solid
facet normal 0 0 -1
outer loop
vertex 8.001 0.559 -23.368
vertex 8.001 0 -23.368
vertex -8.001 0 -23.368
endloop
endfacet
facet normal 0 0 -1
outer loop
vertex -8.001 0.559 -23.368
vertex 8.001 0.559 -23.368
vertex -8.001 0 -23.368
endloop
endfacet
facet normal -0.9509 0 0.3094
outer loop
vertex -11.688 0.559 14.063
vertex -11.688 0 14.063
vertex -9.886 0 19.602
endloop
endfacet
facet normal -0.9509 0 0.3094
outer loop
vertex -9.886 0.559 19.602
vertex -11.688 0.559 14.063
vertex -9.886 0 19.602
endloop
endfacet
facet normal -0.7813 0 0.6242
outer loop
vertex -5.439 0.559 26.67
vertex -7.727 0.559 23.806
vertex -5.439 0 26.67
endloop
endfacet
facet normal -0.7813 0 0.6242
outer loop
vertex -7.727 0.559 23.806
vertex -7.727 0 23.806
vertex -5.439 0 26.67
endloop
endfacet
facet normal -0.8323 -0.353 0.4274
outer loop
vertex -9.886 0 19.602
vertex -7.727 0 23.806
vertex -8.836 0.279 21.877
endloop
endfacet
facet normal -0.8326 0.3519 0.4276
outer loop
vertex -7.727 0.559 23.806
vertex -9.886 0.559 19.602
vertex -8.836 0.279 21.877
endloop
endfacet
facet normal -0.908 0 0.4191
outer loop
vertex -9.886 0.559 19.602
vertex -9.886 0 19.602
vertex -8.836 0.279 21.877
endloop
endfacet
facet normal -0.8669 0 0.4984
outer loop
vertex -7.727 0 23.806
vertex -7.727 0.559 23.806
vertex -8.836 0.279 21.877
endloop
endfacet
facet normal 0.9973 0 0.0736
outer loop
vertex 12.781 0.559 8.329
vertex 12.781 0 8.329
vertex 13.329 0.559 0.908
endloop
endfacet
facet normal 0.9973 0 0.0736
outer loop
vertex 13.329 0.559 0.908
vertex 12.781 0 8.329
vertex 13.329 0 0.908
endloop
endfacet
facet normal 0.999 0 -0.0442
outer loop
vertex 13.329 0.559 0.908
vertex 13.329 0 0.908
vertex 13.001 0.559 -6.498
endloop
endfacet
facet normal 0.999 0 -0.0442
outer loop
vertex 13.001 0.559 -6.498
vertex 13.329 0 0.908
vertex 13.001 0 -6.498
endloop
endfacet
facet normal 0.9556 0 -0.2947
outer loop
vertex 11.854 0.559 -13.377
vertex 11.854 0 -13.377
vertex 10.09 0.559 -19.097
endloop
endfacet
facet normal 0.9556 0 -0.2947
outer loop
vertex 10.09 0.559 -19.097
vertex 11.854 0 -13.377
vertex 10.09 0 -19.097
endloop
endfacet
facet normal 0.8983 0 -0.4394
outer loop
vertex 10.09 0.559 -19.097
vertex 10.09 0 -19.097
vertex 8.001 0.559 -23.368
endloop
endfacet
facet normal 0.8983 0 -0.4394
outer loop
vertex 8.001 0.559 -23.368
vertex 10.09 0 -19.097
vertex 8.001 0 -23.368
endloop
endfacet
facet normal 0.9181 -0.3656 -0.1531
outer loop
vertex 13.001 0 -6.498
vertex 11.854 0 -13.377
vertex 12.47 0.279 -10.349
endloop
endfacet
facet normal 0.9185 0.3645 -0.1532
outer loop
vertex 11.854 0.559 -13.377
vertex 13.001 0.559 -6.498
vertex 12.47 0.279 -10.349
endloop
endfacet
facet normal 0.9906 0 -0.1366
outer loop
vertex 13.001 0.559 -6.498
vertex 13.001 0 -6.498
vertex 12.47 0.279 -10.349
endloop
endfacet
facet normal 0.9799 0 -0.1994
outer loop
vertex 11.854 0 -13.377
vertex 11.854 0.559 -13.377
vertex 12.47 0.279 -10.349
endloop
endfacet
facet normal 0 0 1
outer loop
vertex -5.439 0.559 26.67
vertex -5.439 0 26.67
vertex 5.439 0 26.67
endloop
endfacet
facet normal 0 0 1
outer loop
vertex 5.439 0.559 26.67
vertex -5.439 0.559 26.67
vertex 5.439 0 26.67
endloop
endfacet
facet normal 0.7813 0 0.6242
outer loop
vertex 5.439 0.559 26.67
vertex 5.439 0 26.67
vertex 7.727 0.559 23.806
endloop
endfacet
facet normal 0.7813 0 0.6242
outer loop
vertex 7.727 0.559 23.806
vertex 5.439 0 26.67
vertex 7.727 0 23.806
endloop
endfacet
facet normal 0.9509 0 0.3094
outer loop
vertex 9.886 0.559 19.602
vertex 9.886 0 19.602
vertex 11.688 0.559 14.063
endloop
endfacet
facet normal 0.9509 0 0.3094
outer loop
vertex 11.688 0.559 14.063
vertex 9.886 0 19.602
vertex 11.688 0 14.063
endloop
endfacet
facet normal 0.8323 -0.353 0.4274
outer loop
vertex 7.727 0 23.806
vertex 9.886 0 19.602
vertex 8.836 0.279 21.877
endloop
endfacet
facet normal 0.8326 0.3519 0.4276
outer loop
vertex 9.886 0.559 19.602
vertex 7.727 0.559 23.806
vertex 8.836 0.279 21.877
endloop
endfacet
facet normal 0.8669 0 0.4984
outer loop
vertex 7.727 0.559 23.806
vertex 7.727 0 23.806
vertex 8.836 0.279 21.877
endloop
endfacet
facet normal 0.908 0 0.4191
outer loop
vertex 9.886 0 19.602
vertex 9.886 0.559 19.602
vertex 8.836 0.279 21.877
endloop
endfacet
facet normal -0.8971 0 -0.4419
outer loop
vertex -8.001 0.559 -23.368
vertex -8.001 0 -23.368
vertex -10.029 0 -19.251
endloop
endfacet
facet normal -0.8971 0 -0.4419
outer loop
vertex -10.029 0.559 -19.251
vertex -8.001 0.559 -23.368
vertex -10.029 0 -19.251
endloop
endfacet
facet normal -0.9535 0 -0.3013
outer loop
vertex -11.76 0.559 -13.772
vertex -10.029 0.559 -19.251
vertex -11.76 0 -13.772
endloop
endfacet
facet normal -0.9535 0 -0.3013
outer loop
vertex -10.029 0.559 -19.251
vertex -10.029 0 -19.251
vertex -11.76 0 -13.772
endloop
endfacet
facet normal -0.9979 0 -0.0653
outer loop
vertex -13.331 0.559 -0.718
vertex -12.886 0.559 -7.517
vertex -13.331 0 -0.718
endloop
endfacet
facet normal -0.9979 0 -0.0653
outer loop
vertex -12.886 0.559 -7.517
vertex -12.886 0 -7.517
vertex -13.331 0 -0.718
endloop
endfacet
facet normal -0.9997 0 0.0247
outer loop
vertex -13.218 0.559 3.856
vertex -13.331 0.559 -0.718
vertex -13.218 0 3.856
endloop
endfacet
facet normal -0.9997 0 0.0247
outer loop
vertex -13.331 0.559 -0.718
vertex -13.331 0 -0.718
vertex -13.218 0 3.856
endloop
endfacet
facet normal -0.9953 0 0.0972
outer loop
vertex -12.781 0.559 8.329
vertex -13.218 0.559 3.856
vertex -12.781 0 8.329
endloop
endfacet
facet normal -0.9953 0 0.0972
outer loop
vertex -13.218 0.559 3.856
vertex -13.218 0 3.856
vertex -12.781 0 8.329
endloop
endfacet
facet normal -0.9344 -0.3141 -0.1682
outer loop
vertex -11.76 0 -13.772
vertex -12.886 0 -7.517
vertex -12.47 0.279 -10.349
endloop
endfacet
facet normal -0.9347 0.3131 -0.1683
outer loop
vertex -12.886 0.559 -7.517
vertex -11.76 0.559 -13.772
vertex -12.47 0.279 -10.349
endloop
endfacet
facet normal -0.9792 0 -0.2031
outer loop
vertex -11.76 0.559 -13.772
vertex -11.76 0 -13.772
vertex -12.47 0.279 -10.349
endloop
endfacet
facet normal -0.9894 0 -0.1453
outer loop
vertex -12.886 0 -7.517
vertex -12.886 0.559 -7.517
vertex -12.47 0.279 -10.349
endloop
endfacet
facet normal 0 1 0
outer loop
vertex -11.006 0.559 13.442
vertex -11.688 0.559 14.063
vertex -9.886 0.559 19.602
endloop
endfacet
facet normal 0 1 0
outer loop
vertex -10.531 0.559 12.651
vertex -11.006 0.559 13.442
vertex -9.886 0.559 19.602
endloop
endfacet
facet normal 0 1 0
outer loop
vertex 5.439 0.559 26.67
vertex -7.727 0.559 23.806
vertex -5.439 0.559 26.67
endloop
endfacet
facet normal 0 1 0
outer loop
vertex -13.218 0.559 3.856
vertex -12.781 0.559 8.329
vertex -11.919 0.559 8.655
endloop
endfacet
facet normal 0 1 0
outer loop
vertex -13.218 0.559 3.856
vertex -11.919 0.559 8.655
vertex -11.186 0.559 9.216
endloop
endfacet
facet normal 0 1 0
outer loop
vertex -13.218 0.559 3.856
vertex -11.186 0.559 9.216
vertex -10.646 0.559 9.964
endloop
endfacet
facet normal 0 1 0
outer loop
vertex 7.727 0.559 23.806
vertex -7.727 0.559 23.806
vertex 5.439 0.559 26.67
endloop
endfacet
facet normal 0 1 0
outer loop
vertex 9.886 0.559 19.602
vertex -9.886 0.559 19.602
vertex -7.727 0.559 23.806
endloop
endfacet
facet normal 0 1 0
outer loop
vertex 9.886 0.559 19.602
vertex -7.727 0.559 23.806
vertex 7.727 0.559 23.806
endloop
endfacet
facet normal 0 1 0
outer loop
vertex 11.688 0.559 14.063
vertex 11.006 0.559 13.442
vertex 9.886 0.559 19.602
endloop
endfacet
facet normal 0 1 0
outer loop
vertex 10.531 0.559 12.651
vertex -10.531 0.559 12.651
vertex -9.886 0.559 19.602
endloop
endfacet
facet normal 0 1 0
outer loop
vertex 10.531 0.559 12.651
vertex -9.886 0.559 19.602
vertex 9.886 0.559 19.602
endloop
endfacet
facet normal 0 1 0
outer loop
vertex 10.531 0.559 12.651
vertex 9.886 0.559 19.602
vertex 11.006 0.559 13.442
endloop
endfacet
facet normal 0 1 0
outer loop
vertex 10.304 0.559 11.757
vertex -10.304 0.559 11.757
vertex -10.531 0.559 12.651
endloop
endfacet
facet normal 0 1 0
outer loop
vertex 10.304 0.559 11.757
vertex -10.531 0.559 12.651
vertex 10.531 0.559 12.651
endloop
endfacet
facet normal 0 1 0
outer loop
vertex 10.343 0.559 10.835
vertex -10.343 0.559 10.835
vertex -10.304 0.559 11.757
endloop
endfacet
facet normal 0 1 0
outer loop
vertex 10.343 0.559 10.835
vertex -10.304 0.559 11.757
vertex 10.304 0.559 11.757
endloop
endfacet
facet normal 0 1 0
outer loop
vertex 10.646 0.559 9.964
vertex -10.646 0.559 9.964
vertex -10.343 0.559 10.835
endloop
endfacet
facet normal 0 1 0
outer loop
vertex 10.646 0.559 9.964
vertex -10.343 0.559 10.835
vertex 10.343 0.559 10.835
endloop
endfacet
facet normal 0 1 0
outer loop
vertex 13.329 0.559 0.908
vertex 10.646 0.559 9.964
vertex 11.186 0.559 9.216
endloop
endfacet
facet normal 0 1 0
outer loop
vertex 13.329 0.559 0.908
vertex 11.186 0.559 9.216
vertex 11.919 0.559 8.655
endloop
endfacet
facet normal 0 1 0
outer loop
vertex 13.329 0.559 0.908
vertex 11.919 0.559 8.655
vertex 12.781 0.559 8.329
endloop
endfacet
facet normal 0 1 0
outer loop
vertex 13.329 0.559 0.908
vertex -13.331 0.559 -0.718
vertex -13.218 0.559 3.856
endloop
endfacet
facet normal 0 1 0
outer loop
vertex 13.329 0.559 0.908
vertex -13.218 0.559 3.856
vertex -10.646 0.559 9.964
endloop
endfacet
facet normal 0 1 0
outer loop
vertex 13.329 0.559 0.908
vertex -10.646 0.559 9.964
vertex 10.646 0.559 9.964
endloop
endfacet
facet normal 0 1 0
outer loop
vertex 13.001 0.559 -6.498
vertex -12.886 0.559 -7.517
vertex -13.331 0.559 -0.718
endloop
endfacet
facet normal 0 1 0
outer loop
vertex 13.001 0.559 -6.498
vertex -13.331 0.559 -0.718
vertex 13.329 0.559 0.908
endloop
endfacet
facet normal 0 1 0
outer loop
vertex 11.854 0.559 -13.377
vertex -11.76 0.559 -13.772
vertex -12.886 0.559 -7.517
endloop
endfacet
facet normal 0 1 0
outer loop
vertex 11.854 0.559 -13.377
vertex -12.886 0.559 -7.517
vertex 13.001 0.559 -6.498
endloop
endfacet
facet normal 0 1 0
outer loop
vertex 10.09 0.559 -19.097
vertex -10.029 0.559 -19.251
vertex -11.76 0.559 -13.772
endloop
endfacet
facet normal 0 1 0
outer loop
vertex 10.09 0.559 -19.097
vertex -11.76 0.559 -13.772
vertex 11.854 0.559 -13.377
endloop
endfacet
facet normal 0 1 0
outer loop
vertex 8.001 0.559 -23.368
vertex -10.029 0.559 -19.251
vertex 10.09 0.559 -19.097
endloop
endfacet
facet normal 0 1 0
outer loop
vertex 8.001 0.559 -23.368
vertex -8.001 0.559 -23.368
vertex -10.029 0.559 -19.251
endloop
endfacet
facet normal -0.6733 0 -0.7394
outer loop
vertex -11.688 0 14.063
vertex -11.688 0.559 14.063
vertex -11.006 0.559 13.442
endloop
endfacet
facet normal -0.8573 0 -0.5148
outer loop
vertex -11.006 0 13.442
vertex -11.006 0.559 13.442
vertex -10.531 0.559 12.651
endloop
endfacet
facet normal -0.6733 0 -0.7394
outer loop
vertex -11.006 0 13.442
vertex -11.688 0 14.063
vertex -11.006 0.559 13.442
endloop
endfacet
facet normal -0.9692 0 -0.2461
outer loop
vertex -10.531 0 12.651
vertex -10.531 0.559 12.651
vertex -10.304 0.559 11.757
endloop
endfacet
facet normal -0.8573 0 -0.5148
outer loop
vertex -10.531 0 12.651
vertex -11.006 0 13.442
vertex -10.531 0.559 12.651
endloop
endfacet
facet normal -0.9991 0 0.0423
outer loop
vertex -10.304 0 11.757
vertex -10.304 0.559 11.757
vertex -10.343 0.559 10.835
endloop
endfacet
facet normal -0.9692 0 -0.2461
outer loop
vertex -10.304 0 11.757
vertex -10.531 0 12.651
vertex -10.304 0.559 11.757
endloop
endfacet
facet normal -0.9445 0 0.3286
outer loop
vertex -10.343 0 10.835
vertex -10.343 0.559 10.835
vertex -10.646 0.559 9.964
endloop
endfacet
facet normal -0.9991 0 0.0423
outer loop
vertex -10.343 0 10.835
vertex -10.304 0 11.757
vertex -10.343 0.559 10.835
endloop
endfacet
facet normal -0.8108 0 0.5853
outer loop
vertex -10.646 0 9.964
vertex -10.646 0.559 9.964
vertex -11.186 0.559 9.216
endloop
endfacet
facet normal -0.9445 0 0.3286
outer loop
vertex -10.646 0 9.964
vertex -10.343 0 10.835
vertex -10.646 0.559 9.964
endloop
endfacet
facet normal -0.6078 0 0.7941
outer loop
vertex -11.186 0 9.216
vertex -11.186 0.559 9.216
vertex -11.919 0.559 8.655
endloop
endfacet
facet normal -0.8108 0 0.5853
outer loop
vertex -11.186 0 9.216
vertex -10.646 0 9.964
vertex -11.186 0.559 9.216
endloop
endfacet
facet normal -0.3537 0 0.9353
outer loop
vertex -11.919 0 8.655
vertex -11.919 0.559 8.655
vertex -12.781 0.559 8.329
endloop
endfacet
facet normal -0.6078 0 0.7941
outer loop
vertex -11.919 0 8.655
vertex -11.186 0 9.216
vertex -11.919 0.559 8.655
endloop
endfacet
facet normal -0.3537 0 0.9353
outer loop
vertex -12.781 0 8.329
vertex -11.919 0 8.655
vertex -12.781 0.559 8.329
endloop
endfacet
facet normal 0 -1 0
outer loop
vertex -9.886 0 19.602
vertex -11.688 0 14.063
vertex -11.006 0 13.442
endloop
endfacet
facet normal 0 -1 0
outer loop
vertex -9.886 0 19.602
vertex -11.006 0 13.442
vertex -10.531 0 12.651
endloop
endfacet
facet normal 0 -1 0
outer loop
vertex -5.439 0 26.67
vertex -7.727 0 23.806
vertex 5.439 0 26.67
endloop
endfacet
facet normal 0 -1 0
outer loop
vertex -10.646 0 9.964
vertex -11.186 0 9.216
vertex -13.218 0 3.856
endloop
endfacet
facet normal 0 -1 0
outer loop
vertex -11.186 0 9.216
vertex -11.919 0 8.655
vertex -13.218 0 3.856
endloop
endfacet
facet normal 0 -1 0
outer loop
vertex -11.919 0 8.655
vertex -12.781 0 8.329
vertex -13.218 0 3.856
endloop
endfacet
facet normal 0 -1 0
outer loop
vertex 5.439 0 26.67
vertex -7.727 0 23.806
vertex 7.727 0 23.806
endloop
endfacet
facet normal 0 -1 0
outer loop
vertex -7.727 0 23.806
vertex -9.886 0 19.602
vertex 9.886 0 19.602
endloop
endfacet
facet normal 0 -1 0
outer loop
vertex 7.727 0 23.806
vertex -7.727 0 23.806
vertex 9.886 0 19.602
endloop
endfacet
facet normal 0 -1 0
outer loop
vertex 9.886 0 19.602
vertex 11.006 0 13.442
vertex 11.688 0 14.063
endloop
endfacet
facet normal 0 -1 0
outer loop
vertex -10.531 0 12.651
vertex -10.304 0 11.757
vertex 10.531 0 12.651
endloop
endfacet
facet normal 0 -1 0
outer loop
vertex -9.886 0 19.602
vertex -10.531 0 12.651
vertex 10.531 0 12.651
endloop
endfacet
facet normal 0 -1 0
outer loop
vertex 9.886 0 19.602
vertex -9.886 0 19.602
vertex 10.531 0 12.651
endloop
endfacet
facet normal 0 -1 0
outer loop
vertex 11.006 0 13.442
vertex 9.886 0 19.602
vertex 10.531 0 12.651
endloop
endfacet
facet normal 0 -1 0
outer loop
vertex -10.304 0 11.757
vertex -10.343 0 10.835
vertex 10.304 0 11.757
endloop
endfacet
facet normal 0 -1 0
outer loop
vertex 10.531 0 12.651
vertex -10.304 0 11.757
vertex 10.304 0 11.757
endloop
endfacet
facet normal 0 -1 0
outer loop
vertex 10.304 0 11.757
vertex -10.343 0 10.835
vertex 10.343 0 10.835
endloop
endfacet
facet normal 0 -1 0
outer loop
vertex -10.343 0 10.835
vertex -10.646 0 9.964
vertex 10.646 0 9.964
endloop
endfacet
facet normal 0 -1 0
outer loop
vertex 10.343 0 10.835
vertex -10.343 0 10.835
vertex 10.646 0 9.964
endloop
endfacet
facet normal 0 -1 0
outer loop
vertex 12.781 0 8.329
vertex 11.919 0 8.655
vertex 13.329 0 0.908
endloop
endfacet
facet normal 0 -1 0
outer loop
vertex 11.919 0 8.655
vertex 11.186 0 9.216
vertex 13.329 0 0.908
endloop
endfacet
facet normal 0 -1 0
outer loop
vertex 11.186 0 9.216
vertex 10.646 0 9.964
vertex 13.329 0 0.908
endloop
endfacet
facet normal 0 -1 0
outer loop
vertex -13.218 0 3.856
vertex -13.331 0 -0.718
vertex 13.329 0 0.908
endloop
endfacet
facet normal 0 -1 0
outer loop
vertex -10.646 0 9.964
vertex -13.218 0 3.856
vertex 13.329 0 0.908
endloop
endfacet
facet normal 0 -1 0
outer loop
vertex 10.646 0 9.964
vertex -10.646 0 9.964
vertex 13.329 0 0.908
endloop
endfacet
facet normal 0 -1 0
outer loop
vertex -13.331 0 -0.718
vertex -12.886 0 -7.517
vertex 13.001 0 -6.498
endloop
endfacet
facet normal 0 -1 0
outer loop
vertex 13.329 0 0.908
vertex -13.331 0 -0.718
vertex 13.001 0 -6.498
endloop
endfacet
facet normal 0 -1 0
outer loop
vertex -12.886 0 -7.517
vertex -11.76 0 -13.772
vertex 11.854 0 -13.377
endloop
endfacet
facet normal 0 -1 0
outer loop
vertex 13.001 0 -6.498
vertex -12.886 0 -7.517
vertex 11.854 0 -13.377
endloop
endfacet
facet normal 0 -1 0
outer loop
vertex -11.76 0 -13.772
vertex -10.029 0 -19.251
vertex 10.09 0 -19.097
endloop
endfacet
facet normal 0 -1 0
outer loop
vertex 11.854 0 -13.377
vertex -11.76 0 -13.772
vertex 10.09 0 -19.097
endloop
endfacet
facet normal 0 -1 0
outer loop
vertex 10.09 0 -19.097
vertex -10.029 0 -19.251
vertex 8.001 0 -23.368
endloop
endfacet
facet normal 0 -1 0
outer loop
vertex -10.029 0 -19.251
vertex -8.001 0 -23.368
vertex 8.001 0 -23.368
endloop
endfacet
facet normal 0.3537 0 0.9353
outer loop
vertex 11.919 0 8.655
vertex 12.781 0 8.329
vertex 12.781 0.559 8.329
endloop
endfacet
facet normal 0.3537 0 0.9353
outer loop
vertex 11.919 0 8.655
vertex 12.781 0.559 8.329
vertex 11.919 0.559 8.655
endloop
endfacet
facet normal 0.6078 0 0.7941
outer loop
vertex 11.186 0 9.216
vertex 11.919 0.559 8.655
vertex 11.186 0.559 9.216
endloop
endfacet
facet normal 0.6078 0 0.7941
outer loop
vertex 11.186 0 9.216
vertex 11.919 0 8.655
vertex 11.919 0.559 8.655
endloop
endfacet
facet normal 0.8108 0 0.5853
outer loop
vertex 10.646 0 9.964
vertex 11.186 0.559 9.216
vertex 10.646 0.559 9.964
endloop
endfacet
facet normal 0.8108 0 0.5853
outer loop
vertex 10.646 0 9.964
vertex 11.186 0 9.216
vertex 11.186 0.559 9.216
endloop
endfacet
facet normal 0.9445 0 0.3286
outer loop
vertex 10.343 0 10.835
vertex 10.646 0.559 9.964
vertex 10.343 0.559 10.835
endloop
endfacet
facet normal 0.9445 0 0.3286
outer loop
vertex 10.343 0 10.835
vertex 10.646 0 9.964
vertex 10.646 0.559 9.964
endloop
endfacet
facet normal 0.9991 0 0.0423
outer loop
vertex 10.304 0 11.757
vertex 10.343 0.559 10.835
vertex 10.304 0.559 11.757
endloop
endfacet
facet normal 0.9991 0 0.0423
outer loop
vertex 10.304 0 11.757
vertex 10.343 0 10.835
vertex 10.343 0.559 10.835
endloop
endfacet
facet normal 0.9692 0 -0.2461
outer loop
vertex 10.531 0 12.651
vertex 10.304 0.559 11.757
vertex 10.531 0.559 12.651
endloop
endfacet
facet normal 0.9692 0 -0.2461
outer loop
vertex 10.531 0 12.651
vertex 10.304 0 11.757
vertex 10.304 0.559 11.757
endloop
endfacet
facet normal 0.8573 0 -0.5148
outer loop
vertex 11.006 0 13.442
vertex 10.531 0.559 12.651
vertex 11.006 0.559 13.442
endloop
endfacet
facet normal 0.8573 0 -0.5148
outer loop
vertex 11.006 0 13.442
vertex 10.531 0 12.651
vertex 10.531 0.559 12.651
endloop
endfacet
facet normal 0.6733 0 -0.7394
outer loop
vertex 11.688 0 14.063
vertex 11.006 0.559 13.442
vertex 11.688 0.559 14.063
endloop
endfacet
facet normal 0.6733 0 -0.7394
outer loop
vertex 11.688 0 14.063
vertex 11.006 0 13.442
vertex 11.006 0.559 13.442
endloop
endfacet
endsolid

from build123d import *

# Parameters (mm, degrees)
BOSS_EXTRUDE1_DEPTH = 0.5588
SKETCH2_R           = 3.175
CUT_EXTRUDE3_DEPTH  = 30.823202218


with BuildPart() as part:
    # Sketch1 → Boss-Extrude1 (new body)
    with BuildSketch(Plane(origin=(0, 0, 0), x_dir=(1, 0, 0), z_dir=(0, 1, 0))):
        with BuildLine():
            Line((-5.43884297, -26.67), (5.43884297, -26.67))
            add(Edge.make_bspline(
                [(5.43884297, -26.67), (26.133188211, -6.420594918), (8.001, 23.368)],
                knots=[0.420111478, 0.420111478, 0.420111478, 2.498091545, 2.498091545, 2.498091545], degree=2, weights=[1, 0.507090998, 1]))
            Line((8.001, 23.368), (-8.001, 23.368))
            add(Edge.make_bspline(
                [(-8.001, 23.368), (-26.133188211, -6.420594918), (-5.43884297, -26.67)],
                knots=[3.785093762, 3.785093762, 3.785093762, 5.863073829, 5.863073829, 5.863073829], degree=2, weights=[1, 0.507090998, 1]))
        make_face()
    extrude(amount=BOSS_EXTRUDE1_DEPTH)

    # Sketch2 → Cut-Extrude3 (cut, through all)
    with BuildSketch(Plane(origin=(0, 0, 0), x_dir=(1, 0, 0), z_dir=(0, 1, 0))):
        with Locations((-13.462, -11.43)):
            Circle(SKETCH2_R)
        with Locations((13.462, -11.43)):
            Circle(SKETCH2_R)
    extrude(amount=CUT_EXTRUDE3_DEPTH, mode=Mode.SUBTRACT)


solid = part.part
